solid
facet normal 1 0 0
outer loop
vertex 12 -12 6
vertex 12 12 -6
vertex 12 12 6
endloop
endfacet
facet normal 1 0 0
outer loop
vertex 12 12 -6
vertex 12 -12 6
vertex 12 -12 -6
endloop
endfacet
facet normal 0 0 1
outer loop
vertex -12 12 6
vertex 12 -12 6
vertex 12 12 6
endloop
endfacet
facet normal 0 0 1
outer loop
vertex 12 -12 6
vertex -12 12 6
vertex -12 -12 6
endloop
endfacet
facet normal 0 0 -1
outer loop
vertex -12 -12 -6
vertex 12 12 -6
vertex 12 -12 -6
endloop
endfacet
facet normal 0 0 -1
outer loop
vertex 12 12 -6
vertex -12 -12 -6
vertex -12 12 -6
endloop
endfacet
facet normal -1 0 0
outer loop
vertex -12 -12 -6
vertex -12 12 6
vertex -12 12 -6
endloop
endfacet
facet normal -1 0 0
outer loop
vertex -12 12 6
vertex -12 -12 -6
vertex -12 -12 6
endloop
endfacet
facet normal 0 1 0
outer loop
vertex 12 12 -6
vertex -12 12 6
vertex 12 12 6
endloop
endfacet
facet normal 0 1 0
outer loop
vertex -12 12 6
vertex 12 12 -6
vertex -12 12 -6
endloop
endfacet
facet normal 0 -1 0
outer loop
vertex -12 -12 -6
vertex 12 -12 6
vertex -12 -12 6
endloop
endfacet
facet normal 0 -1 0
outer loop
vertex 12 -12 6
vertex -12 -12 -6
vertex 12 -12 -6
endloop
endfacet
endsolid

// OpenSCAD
$fn = 50;

difference() {
	union() {
		translate(v = [-12.0, -12.0, -6.0]) {
			cube(size = [24, 24, 12]);
		}
	}
	union();
}
